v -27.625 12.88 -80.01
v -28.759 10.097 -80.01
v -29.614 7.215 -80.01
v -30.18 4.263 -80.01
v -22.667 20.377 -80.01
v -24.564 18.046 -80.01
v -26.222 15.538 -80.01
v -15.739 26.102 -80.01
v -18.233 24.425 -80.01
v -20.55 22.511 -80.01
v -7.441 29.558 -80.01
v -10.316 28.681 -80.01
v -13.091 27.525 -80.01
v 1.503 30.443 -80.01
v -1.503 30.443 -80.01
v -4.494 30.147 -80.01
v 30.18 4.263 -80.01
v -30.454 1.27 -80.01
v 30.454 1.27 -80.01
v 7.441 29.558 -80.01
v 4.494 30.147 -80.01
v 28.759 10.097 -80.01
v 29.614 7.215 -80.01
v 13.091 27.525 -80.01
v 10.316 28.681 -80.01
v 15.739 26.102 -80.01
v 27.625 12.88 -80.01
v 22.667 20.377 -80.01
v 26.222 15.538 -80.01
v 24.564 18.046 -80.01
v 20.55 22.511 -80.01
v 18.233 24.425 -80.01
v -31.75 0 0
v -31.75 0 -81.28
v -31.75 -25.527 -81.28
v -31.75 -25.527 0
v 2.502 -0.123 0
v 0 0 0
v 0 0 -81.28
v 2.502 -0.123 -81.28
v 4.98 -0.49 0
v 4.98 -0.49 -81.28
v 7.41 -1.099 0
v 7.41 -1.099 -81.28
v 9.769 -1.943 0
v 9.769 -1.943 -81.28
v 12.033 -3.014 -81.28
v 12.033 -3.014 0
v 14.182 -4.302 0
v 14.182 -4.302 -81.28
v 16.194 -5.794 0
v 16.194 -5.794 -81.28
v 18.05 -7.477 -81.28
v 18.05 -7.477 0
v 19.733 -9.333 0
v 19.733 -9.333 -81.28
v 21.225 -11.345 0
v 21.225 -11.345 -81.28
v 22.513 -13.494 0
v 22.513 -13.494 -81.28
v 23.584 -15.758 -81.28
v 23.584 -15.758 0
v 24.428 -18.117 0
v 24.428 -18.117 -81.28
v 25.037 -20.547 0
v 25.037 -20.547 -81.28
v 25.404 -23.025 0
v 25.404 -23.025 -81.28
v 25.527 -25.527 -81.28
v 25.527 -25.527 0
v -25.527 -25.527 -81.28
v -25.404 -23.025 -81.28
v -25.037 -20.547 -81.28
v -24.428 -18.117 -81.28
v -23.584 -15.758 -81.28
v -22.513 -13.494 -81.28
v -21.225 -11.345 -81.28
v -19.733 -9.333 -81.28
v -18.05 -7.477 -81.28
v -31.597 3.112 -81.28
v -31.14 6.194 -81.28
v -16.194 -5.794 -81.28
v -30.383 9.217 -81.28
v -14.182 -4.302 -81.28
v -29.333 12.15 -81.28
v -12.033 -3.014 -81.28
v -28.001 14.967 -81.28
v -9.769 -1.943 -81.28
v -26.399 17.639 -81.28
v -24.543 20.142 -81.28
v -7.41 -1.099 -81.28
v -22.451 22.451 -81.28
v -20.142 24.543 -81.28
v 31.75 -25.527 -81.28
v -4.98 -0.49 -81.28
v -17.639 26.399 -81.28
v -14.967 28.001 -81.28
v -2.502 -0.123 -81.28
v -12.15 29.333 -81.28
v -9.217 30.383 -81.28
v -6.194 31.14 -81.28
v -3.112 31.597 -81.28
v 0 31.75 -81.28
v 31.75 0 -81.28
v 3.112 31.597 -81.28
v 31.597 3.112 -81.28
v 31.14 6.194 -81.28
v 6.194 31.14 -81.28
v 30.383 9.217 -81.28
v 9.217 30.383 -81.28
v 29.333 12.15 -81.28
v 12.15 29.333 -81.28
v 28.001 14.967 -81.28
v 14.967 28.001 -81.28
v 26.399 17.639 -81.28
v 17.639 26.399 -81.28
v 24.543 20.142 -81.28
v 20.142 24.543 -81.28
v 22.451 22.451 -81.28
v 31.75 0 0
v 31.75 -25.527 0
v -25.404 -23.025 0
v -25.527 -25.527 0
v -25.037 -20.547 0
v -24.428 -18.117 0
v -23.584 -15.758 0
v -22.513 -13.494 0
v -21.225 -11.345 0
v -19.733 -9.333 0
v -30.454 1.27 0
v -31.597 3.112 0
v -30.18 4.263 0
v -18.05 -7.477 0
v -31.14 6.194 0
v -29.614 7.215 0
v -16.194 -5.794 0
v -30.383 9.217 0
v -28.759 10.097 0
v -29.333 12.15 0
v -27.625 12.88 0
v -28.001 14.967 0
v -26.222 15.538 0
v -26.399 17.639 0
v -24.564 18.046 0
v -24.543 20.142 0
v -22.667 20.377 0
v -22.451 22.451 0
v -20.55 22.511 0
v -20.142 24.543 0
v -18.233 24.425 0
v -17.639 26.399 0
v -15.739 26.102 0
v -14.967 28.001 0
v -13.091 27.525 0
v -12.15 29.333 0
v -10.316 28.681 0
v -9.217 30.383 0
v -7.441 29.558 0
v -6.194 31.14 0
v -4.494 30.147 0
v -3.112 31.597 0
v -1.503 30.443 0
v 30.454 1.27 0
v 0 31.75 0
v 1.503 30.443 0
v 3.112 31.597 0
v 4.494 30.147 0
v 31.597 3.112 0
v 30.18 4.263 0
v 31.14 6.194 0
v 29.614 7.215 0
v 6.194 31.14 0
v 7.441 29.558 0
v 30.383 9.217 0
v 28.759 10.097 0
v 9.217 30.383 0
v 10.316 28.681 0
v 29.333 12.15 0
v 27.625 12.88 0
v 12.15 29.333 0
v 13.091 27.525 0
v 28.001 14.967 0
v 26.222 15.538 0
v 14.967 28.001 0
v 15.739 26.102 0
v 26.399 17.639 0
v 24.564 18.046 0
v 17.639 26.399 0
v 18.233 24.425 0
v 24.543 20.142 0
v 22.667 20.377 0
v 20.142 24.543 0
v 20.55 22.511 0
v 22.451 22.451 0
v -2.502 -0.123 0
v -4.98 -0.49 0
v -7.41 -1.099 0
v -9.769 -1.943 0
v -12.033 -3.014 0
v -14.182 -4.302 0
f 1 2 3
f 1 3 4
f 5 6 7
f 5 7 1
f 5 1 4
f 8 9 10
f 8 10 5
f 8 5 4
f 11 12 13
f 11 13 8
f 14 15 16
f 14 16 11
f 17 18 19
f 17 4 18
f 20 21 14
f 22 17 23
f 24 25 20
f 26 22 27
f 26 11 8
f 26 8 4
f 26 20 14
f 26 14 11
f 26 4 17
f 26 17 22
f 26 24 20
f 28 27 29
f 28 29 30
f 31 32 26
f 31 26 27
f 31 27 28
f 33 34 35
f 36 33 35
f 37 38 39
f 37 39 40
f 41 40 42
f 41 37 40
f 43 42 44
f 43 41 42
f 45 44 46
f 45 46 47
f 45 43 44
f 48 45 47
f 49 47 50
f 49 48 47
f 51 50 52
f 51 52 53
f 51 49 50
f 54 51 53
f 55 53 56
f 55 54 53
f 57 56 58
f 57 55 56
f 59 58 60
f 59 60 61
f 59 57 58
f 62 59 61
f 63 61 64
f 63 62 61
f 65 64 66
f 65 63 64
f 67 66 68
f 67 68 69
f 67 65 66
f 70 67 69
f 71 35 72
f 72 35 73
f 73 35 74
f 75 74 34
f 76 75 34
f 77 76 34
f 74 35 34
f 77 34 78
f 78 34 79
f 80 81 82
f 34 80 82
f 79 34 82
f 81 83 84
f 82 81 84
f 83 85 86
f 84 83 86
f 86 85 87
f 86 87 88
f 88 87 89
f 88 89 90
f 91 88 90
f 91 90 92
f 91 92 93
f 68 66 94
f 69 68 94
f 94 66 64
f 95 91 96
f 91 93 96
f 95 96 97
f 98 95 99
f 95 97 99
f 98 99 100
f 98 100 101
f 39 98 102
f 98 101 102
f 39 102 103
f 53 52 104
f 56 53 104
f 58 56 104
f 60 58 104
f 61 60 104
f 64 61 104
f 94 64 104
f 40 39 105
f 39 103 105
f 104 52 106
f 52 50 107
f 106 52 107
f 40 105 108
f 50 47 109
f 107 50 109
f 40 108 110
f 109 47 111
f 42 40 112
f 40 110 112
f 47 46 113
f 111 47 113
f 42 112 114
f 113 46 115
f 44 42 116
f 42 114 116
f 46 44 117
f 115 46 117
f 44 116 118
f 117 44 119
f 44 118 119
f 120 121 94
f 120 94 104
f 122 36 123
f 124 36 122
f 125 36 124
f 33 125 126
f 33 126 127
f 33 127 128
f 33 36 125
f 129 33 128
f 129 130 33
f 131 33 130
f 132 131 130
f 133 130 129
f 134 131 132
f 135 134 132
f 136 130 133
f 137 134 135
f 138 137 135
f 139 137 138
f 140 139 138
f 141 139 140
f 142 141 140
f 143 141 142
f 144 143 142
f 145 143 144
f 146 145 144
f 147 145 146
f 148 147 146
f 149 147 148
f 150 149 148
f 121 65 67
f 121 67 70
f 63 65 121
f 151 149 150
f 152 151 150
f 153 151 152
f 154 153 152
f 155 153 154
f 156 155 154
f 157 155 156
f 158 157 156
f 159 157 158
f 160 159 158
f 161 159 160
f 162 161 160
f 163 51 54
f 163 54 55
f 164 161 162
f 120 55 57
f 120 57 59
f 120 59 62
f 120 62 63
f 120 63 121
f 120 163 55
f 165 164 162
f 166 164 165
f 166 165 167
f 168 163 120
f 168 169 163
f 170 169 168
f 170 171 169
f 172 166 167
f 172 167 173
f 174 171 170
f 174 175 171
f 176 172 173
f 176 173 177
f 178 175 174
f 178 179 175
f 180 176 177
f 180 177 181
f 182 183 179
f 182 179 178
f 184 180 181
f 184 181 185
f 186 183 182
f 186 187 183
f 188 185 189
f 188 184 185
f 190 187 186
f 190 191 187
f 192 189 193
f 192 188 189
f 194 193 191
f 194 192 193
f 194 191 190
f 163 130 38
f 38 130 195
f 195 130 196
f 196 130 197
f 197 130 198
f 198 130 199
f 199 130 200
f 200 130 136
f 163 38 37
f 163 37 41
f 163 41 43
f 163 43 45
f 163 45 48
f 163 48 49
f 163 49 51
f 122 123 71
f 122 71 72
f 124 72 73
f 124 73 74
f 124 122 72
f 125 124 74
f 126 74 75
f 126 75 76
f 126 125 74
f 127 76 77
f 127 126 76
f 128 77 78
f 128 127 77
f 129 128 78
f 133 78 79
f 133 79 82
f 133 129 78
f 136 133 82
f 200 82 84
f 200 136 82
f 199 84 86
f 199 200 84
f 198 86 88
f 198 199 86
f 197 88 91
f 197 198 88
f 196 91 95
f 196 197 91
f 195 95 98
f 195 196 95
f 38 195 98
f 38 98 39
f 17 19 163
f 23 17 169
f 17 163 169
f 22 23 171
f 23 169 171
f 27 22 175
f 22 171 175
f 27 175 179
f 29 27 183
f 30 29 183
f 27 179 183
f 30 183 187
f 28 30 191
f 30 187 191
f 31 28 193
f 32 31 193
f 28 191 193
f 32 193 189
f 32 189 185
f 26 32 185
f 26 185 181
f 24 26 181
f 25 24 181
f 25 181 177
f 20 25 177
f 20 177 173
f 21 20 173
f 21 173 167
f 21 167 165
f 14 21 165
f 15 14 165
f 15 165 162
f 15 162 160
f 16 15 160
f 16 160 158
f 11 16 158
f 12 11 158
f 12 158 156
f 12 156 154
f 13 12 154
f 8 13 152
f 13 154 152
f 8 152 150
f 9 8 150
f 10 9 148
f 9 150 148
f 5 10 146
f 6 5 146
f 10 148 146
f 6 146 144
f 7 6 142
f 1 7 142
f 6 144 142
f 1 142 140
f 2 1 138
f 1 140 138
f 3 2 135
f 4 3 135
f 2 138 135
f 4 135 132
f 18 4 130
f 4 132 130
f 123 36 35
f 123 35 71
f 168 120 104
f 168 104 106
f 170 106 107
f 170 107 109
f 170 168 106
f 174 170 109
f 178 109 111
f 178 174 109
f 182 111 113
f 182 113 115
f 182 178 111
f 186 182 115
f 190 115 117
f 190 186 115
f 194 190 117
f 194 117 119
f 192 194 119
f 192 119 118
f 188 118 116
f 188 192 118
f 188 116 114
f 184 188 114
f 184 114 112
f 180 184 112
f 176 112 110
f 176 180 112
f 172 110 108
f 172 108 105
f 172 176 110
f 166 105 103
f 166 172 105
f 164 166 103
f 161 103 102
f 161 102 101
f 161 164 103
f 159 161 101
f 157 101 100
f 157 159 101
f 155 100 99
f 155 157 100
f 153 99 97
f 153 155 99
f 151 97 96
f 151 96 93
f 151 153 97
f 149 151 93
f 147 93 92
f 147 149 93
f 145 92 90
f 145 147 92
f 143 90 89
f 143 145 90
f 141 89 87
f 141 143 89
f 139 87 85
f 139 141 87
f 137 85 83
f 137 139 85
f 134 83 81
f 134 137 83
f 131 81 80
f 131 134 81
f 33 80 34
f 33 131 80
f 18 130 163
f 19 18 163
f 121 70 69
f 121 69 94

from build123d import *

# Parameters (mm, degrees)
BOSS_EXTRUDE1_DEPTH = 81.28
SHELL2_T            = -1.27
BOSS_EXTRUDE2_DEPTH = 81.28


with BuildPart() as part:
    # Sketch1 → Boss-Extrude1 (new body)
    with BuildSketch(Plane.XY):
        with BuildLine():
            Line((-31.75, 0), (31.75, 0))
            ThreePointArc((31.75, 0), (0, 31.75), (-31.75, 0))
        make_face()
    extrude(amount=-BOSS_EXTRUDE1_DEPTH)

    # Shell2
    shell2_openings = [part.faces().sort_by_distance(p)[0] for p in [
        (0, 13.475118515, 0),
    ]]
    offset(amount=SHELL2_T, openings=shell2_openings)

    # Sketch5 → Boss-Extrude2 (add)
    with BuildSketch(Plane.XY):
        with BuildLine():
            Line((-3.8e-08, 0), (-31.75, 0))
            Line((-31.75, 0), (-31.75, -25.527))
            Line((-31.75, -25.527), (-25.527, -25.527))
            ThreePointArc((-25.527, -25.527), (-18.050314817, -7.47668521), (-3.8e-08, 0))
        make_face()
        with BuildLine():
            Line((31.75, 0), (-3.8e-08, 0))
            ThreePointArc((-3.8e-08, 0), (18.05031479, -7.476685183), (25.527, -25.527))
            Line((25.527, -25.527), (31.75, -25.527))
            Line((31.75, -25.527), (31.75, 0))
        make_face()
    extrude(amount=-BOSS_EXTRUDE2_DEPTH)


solid = part.part
